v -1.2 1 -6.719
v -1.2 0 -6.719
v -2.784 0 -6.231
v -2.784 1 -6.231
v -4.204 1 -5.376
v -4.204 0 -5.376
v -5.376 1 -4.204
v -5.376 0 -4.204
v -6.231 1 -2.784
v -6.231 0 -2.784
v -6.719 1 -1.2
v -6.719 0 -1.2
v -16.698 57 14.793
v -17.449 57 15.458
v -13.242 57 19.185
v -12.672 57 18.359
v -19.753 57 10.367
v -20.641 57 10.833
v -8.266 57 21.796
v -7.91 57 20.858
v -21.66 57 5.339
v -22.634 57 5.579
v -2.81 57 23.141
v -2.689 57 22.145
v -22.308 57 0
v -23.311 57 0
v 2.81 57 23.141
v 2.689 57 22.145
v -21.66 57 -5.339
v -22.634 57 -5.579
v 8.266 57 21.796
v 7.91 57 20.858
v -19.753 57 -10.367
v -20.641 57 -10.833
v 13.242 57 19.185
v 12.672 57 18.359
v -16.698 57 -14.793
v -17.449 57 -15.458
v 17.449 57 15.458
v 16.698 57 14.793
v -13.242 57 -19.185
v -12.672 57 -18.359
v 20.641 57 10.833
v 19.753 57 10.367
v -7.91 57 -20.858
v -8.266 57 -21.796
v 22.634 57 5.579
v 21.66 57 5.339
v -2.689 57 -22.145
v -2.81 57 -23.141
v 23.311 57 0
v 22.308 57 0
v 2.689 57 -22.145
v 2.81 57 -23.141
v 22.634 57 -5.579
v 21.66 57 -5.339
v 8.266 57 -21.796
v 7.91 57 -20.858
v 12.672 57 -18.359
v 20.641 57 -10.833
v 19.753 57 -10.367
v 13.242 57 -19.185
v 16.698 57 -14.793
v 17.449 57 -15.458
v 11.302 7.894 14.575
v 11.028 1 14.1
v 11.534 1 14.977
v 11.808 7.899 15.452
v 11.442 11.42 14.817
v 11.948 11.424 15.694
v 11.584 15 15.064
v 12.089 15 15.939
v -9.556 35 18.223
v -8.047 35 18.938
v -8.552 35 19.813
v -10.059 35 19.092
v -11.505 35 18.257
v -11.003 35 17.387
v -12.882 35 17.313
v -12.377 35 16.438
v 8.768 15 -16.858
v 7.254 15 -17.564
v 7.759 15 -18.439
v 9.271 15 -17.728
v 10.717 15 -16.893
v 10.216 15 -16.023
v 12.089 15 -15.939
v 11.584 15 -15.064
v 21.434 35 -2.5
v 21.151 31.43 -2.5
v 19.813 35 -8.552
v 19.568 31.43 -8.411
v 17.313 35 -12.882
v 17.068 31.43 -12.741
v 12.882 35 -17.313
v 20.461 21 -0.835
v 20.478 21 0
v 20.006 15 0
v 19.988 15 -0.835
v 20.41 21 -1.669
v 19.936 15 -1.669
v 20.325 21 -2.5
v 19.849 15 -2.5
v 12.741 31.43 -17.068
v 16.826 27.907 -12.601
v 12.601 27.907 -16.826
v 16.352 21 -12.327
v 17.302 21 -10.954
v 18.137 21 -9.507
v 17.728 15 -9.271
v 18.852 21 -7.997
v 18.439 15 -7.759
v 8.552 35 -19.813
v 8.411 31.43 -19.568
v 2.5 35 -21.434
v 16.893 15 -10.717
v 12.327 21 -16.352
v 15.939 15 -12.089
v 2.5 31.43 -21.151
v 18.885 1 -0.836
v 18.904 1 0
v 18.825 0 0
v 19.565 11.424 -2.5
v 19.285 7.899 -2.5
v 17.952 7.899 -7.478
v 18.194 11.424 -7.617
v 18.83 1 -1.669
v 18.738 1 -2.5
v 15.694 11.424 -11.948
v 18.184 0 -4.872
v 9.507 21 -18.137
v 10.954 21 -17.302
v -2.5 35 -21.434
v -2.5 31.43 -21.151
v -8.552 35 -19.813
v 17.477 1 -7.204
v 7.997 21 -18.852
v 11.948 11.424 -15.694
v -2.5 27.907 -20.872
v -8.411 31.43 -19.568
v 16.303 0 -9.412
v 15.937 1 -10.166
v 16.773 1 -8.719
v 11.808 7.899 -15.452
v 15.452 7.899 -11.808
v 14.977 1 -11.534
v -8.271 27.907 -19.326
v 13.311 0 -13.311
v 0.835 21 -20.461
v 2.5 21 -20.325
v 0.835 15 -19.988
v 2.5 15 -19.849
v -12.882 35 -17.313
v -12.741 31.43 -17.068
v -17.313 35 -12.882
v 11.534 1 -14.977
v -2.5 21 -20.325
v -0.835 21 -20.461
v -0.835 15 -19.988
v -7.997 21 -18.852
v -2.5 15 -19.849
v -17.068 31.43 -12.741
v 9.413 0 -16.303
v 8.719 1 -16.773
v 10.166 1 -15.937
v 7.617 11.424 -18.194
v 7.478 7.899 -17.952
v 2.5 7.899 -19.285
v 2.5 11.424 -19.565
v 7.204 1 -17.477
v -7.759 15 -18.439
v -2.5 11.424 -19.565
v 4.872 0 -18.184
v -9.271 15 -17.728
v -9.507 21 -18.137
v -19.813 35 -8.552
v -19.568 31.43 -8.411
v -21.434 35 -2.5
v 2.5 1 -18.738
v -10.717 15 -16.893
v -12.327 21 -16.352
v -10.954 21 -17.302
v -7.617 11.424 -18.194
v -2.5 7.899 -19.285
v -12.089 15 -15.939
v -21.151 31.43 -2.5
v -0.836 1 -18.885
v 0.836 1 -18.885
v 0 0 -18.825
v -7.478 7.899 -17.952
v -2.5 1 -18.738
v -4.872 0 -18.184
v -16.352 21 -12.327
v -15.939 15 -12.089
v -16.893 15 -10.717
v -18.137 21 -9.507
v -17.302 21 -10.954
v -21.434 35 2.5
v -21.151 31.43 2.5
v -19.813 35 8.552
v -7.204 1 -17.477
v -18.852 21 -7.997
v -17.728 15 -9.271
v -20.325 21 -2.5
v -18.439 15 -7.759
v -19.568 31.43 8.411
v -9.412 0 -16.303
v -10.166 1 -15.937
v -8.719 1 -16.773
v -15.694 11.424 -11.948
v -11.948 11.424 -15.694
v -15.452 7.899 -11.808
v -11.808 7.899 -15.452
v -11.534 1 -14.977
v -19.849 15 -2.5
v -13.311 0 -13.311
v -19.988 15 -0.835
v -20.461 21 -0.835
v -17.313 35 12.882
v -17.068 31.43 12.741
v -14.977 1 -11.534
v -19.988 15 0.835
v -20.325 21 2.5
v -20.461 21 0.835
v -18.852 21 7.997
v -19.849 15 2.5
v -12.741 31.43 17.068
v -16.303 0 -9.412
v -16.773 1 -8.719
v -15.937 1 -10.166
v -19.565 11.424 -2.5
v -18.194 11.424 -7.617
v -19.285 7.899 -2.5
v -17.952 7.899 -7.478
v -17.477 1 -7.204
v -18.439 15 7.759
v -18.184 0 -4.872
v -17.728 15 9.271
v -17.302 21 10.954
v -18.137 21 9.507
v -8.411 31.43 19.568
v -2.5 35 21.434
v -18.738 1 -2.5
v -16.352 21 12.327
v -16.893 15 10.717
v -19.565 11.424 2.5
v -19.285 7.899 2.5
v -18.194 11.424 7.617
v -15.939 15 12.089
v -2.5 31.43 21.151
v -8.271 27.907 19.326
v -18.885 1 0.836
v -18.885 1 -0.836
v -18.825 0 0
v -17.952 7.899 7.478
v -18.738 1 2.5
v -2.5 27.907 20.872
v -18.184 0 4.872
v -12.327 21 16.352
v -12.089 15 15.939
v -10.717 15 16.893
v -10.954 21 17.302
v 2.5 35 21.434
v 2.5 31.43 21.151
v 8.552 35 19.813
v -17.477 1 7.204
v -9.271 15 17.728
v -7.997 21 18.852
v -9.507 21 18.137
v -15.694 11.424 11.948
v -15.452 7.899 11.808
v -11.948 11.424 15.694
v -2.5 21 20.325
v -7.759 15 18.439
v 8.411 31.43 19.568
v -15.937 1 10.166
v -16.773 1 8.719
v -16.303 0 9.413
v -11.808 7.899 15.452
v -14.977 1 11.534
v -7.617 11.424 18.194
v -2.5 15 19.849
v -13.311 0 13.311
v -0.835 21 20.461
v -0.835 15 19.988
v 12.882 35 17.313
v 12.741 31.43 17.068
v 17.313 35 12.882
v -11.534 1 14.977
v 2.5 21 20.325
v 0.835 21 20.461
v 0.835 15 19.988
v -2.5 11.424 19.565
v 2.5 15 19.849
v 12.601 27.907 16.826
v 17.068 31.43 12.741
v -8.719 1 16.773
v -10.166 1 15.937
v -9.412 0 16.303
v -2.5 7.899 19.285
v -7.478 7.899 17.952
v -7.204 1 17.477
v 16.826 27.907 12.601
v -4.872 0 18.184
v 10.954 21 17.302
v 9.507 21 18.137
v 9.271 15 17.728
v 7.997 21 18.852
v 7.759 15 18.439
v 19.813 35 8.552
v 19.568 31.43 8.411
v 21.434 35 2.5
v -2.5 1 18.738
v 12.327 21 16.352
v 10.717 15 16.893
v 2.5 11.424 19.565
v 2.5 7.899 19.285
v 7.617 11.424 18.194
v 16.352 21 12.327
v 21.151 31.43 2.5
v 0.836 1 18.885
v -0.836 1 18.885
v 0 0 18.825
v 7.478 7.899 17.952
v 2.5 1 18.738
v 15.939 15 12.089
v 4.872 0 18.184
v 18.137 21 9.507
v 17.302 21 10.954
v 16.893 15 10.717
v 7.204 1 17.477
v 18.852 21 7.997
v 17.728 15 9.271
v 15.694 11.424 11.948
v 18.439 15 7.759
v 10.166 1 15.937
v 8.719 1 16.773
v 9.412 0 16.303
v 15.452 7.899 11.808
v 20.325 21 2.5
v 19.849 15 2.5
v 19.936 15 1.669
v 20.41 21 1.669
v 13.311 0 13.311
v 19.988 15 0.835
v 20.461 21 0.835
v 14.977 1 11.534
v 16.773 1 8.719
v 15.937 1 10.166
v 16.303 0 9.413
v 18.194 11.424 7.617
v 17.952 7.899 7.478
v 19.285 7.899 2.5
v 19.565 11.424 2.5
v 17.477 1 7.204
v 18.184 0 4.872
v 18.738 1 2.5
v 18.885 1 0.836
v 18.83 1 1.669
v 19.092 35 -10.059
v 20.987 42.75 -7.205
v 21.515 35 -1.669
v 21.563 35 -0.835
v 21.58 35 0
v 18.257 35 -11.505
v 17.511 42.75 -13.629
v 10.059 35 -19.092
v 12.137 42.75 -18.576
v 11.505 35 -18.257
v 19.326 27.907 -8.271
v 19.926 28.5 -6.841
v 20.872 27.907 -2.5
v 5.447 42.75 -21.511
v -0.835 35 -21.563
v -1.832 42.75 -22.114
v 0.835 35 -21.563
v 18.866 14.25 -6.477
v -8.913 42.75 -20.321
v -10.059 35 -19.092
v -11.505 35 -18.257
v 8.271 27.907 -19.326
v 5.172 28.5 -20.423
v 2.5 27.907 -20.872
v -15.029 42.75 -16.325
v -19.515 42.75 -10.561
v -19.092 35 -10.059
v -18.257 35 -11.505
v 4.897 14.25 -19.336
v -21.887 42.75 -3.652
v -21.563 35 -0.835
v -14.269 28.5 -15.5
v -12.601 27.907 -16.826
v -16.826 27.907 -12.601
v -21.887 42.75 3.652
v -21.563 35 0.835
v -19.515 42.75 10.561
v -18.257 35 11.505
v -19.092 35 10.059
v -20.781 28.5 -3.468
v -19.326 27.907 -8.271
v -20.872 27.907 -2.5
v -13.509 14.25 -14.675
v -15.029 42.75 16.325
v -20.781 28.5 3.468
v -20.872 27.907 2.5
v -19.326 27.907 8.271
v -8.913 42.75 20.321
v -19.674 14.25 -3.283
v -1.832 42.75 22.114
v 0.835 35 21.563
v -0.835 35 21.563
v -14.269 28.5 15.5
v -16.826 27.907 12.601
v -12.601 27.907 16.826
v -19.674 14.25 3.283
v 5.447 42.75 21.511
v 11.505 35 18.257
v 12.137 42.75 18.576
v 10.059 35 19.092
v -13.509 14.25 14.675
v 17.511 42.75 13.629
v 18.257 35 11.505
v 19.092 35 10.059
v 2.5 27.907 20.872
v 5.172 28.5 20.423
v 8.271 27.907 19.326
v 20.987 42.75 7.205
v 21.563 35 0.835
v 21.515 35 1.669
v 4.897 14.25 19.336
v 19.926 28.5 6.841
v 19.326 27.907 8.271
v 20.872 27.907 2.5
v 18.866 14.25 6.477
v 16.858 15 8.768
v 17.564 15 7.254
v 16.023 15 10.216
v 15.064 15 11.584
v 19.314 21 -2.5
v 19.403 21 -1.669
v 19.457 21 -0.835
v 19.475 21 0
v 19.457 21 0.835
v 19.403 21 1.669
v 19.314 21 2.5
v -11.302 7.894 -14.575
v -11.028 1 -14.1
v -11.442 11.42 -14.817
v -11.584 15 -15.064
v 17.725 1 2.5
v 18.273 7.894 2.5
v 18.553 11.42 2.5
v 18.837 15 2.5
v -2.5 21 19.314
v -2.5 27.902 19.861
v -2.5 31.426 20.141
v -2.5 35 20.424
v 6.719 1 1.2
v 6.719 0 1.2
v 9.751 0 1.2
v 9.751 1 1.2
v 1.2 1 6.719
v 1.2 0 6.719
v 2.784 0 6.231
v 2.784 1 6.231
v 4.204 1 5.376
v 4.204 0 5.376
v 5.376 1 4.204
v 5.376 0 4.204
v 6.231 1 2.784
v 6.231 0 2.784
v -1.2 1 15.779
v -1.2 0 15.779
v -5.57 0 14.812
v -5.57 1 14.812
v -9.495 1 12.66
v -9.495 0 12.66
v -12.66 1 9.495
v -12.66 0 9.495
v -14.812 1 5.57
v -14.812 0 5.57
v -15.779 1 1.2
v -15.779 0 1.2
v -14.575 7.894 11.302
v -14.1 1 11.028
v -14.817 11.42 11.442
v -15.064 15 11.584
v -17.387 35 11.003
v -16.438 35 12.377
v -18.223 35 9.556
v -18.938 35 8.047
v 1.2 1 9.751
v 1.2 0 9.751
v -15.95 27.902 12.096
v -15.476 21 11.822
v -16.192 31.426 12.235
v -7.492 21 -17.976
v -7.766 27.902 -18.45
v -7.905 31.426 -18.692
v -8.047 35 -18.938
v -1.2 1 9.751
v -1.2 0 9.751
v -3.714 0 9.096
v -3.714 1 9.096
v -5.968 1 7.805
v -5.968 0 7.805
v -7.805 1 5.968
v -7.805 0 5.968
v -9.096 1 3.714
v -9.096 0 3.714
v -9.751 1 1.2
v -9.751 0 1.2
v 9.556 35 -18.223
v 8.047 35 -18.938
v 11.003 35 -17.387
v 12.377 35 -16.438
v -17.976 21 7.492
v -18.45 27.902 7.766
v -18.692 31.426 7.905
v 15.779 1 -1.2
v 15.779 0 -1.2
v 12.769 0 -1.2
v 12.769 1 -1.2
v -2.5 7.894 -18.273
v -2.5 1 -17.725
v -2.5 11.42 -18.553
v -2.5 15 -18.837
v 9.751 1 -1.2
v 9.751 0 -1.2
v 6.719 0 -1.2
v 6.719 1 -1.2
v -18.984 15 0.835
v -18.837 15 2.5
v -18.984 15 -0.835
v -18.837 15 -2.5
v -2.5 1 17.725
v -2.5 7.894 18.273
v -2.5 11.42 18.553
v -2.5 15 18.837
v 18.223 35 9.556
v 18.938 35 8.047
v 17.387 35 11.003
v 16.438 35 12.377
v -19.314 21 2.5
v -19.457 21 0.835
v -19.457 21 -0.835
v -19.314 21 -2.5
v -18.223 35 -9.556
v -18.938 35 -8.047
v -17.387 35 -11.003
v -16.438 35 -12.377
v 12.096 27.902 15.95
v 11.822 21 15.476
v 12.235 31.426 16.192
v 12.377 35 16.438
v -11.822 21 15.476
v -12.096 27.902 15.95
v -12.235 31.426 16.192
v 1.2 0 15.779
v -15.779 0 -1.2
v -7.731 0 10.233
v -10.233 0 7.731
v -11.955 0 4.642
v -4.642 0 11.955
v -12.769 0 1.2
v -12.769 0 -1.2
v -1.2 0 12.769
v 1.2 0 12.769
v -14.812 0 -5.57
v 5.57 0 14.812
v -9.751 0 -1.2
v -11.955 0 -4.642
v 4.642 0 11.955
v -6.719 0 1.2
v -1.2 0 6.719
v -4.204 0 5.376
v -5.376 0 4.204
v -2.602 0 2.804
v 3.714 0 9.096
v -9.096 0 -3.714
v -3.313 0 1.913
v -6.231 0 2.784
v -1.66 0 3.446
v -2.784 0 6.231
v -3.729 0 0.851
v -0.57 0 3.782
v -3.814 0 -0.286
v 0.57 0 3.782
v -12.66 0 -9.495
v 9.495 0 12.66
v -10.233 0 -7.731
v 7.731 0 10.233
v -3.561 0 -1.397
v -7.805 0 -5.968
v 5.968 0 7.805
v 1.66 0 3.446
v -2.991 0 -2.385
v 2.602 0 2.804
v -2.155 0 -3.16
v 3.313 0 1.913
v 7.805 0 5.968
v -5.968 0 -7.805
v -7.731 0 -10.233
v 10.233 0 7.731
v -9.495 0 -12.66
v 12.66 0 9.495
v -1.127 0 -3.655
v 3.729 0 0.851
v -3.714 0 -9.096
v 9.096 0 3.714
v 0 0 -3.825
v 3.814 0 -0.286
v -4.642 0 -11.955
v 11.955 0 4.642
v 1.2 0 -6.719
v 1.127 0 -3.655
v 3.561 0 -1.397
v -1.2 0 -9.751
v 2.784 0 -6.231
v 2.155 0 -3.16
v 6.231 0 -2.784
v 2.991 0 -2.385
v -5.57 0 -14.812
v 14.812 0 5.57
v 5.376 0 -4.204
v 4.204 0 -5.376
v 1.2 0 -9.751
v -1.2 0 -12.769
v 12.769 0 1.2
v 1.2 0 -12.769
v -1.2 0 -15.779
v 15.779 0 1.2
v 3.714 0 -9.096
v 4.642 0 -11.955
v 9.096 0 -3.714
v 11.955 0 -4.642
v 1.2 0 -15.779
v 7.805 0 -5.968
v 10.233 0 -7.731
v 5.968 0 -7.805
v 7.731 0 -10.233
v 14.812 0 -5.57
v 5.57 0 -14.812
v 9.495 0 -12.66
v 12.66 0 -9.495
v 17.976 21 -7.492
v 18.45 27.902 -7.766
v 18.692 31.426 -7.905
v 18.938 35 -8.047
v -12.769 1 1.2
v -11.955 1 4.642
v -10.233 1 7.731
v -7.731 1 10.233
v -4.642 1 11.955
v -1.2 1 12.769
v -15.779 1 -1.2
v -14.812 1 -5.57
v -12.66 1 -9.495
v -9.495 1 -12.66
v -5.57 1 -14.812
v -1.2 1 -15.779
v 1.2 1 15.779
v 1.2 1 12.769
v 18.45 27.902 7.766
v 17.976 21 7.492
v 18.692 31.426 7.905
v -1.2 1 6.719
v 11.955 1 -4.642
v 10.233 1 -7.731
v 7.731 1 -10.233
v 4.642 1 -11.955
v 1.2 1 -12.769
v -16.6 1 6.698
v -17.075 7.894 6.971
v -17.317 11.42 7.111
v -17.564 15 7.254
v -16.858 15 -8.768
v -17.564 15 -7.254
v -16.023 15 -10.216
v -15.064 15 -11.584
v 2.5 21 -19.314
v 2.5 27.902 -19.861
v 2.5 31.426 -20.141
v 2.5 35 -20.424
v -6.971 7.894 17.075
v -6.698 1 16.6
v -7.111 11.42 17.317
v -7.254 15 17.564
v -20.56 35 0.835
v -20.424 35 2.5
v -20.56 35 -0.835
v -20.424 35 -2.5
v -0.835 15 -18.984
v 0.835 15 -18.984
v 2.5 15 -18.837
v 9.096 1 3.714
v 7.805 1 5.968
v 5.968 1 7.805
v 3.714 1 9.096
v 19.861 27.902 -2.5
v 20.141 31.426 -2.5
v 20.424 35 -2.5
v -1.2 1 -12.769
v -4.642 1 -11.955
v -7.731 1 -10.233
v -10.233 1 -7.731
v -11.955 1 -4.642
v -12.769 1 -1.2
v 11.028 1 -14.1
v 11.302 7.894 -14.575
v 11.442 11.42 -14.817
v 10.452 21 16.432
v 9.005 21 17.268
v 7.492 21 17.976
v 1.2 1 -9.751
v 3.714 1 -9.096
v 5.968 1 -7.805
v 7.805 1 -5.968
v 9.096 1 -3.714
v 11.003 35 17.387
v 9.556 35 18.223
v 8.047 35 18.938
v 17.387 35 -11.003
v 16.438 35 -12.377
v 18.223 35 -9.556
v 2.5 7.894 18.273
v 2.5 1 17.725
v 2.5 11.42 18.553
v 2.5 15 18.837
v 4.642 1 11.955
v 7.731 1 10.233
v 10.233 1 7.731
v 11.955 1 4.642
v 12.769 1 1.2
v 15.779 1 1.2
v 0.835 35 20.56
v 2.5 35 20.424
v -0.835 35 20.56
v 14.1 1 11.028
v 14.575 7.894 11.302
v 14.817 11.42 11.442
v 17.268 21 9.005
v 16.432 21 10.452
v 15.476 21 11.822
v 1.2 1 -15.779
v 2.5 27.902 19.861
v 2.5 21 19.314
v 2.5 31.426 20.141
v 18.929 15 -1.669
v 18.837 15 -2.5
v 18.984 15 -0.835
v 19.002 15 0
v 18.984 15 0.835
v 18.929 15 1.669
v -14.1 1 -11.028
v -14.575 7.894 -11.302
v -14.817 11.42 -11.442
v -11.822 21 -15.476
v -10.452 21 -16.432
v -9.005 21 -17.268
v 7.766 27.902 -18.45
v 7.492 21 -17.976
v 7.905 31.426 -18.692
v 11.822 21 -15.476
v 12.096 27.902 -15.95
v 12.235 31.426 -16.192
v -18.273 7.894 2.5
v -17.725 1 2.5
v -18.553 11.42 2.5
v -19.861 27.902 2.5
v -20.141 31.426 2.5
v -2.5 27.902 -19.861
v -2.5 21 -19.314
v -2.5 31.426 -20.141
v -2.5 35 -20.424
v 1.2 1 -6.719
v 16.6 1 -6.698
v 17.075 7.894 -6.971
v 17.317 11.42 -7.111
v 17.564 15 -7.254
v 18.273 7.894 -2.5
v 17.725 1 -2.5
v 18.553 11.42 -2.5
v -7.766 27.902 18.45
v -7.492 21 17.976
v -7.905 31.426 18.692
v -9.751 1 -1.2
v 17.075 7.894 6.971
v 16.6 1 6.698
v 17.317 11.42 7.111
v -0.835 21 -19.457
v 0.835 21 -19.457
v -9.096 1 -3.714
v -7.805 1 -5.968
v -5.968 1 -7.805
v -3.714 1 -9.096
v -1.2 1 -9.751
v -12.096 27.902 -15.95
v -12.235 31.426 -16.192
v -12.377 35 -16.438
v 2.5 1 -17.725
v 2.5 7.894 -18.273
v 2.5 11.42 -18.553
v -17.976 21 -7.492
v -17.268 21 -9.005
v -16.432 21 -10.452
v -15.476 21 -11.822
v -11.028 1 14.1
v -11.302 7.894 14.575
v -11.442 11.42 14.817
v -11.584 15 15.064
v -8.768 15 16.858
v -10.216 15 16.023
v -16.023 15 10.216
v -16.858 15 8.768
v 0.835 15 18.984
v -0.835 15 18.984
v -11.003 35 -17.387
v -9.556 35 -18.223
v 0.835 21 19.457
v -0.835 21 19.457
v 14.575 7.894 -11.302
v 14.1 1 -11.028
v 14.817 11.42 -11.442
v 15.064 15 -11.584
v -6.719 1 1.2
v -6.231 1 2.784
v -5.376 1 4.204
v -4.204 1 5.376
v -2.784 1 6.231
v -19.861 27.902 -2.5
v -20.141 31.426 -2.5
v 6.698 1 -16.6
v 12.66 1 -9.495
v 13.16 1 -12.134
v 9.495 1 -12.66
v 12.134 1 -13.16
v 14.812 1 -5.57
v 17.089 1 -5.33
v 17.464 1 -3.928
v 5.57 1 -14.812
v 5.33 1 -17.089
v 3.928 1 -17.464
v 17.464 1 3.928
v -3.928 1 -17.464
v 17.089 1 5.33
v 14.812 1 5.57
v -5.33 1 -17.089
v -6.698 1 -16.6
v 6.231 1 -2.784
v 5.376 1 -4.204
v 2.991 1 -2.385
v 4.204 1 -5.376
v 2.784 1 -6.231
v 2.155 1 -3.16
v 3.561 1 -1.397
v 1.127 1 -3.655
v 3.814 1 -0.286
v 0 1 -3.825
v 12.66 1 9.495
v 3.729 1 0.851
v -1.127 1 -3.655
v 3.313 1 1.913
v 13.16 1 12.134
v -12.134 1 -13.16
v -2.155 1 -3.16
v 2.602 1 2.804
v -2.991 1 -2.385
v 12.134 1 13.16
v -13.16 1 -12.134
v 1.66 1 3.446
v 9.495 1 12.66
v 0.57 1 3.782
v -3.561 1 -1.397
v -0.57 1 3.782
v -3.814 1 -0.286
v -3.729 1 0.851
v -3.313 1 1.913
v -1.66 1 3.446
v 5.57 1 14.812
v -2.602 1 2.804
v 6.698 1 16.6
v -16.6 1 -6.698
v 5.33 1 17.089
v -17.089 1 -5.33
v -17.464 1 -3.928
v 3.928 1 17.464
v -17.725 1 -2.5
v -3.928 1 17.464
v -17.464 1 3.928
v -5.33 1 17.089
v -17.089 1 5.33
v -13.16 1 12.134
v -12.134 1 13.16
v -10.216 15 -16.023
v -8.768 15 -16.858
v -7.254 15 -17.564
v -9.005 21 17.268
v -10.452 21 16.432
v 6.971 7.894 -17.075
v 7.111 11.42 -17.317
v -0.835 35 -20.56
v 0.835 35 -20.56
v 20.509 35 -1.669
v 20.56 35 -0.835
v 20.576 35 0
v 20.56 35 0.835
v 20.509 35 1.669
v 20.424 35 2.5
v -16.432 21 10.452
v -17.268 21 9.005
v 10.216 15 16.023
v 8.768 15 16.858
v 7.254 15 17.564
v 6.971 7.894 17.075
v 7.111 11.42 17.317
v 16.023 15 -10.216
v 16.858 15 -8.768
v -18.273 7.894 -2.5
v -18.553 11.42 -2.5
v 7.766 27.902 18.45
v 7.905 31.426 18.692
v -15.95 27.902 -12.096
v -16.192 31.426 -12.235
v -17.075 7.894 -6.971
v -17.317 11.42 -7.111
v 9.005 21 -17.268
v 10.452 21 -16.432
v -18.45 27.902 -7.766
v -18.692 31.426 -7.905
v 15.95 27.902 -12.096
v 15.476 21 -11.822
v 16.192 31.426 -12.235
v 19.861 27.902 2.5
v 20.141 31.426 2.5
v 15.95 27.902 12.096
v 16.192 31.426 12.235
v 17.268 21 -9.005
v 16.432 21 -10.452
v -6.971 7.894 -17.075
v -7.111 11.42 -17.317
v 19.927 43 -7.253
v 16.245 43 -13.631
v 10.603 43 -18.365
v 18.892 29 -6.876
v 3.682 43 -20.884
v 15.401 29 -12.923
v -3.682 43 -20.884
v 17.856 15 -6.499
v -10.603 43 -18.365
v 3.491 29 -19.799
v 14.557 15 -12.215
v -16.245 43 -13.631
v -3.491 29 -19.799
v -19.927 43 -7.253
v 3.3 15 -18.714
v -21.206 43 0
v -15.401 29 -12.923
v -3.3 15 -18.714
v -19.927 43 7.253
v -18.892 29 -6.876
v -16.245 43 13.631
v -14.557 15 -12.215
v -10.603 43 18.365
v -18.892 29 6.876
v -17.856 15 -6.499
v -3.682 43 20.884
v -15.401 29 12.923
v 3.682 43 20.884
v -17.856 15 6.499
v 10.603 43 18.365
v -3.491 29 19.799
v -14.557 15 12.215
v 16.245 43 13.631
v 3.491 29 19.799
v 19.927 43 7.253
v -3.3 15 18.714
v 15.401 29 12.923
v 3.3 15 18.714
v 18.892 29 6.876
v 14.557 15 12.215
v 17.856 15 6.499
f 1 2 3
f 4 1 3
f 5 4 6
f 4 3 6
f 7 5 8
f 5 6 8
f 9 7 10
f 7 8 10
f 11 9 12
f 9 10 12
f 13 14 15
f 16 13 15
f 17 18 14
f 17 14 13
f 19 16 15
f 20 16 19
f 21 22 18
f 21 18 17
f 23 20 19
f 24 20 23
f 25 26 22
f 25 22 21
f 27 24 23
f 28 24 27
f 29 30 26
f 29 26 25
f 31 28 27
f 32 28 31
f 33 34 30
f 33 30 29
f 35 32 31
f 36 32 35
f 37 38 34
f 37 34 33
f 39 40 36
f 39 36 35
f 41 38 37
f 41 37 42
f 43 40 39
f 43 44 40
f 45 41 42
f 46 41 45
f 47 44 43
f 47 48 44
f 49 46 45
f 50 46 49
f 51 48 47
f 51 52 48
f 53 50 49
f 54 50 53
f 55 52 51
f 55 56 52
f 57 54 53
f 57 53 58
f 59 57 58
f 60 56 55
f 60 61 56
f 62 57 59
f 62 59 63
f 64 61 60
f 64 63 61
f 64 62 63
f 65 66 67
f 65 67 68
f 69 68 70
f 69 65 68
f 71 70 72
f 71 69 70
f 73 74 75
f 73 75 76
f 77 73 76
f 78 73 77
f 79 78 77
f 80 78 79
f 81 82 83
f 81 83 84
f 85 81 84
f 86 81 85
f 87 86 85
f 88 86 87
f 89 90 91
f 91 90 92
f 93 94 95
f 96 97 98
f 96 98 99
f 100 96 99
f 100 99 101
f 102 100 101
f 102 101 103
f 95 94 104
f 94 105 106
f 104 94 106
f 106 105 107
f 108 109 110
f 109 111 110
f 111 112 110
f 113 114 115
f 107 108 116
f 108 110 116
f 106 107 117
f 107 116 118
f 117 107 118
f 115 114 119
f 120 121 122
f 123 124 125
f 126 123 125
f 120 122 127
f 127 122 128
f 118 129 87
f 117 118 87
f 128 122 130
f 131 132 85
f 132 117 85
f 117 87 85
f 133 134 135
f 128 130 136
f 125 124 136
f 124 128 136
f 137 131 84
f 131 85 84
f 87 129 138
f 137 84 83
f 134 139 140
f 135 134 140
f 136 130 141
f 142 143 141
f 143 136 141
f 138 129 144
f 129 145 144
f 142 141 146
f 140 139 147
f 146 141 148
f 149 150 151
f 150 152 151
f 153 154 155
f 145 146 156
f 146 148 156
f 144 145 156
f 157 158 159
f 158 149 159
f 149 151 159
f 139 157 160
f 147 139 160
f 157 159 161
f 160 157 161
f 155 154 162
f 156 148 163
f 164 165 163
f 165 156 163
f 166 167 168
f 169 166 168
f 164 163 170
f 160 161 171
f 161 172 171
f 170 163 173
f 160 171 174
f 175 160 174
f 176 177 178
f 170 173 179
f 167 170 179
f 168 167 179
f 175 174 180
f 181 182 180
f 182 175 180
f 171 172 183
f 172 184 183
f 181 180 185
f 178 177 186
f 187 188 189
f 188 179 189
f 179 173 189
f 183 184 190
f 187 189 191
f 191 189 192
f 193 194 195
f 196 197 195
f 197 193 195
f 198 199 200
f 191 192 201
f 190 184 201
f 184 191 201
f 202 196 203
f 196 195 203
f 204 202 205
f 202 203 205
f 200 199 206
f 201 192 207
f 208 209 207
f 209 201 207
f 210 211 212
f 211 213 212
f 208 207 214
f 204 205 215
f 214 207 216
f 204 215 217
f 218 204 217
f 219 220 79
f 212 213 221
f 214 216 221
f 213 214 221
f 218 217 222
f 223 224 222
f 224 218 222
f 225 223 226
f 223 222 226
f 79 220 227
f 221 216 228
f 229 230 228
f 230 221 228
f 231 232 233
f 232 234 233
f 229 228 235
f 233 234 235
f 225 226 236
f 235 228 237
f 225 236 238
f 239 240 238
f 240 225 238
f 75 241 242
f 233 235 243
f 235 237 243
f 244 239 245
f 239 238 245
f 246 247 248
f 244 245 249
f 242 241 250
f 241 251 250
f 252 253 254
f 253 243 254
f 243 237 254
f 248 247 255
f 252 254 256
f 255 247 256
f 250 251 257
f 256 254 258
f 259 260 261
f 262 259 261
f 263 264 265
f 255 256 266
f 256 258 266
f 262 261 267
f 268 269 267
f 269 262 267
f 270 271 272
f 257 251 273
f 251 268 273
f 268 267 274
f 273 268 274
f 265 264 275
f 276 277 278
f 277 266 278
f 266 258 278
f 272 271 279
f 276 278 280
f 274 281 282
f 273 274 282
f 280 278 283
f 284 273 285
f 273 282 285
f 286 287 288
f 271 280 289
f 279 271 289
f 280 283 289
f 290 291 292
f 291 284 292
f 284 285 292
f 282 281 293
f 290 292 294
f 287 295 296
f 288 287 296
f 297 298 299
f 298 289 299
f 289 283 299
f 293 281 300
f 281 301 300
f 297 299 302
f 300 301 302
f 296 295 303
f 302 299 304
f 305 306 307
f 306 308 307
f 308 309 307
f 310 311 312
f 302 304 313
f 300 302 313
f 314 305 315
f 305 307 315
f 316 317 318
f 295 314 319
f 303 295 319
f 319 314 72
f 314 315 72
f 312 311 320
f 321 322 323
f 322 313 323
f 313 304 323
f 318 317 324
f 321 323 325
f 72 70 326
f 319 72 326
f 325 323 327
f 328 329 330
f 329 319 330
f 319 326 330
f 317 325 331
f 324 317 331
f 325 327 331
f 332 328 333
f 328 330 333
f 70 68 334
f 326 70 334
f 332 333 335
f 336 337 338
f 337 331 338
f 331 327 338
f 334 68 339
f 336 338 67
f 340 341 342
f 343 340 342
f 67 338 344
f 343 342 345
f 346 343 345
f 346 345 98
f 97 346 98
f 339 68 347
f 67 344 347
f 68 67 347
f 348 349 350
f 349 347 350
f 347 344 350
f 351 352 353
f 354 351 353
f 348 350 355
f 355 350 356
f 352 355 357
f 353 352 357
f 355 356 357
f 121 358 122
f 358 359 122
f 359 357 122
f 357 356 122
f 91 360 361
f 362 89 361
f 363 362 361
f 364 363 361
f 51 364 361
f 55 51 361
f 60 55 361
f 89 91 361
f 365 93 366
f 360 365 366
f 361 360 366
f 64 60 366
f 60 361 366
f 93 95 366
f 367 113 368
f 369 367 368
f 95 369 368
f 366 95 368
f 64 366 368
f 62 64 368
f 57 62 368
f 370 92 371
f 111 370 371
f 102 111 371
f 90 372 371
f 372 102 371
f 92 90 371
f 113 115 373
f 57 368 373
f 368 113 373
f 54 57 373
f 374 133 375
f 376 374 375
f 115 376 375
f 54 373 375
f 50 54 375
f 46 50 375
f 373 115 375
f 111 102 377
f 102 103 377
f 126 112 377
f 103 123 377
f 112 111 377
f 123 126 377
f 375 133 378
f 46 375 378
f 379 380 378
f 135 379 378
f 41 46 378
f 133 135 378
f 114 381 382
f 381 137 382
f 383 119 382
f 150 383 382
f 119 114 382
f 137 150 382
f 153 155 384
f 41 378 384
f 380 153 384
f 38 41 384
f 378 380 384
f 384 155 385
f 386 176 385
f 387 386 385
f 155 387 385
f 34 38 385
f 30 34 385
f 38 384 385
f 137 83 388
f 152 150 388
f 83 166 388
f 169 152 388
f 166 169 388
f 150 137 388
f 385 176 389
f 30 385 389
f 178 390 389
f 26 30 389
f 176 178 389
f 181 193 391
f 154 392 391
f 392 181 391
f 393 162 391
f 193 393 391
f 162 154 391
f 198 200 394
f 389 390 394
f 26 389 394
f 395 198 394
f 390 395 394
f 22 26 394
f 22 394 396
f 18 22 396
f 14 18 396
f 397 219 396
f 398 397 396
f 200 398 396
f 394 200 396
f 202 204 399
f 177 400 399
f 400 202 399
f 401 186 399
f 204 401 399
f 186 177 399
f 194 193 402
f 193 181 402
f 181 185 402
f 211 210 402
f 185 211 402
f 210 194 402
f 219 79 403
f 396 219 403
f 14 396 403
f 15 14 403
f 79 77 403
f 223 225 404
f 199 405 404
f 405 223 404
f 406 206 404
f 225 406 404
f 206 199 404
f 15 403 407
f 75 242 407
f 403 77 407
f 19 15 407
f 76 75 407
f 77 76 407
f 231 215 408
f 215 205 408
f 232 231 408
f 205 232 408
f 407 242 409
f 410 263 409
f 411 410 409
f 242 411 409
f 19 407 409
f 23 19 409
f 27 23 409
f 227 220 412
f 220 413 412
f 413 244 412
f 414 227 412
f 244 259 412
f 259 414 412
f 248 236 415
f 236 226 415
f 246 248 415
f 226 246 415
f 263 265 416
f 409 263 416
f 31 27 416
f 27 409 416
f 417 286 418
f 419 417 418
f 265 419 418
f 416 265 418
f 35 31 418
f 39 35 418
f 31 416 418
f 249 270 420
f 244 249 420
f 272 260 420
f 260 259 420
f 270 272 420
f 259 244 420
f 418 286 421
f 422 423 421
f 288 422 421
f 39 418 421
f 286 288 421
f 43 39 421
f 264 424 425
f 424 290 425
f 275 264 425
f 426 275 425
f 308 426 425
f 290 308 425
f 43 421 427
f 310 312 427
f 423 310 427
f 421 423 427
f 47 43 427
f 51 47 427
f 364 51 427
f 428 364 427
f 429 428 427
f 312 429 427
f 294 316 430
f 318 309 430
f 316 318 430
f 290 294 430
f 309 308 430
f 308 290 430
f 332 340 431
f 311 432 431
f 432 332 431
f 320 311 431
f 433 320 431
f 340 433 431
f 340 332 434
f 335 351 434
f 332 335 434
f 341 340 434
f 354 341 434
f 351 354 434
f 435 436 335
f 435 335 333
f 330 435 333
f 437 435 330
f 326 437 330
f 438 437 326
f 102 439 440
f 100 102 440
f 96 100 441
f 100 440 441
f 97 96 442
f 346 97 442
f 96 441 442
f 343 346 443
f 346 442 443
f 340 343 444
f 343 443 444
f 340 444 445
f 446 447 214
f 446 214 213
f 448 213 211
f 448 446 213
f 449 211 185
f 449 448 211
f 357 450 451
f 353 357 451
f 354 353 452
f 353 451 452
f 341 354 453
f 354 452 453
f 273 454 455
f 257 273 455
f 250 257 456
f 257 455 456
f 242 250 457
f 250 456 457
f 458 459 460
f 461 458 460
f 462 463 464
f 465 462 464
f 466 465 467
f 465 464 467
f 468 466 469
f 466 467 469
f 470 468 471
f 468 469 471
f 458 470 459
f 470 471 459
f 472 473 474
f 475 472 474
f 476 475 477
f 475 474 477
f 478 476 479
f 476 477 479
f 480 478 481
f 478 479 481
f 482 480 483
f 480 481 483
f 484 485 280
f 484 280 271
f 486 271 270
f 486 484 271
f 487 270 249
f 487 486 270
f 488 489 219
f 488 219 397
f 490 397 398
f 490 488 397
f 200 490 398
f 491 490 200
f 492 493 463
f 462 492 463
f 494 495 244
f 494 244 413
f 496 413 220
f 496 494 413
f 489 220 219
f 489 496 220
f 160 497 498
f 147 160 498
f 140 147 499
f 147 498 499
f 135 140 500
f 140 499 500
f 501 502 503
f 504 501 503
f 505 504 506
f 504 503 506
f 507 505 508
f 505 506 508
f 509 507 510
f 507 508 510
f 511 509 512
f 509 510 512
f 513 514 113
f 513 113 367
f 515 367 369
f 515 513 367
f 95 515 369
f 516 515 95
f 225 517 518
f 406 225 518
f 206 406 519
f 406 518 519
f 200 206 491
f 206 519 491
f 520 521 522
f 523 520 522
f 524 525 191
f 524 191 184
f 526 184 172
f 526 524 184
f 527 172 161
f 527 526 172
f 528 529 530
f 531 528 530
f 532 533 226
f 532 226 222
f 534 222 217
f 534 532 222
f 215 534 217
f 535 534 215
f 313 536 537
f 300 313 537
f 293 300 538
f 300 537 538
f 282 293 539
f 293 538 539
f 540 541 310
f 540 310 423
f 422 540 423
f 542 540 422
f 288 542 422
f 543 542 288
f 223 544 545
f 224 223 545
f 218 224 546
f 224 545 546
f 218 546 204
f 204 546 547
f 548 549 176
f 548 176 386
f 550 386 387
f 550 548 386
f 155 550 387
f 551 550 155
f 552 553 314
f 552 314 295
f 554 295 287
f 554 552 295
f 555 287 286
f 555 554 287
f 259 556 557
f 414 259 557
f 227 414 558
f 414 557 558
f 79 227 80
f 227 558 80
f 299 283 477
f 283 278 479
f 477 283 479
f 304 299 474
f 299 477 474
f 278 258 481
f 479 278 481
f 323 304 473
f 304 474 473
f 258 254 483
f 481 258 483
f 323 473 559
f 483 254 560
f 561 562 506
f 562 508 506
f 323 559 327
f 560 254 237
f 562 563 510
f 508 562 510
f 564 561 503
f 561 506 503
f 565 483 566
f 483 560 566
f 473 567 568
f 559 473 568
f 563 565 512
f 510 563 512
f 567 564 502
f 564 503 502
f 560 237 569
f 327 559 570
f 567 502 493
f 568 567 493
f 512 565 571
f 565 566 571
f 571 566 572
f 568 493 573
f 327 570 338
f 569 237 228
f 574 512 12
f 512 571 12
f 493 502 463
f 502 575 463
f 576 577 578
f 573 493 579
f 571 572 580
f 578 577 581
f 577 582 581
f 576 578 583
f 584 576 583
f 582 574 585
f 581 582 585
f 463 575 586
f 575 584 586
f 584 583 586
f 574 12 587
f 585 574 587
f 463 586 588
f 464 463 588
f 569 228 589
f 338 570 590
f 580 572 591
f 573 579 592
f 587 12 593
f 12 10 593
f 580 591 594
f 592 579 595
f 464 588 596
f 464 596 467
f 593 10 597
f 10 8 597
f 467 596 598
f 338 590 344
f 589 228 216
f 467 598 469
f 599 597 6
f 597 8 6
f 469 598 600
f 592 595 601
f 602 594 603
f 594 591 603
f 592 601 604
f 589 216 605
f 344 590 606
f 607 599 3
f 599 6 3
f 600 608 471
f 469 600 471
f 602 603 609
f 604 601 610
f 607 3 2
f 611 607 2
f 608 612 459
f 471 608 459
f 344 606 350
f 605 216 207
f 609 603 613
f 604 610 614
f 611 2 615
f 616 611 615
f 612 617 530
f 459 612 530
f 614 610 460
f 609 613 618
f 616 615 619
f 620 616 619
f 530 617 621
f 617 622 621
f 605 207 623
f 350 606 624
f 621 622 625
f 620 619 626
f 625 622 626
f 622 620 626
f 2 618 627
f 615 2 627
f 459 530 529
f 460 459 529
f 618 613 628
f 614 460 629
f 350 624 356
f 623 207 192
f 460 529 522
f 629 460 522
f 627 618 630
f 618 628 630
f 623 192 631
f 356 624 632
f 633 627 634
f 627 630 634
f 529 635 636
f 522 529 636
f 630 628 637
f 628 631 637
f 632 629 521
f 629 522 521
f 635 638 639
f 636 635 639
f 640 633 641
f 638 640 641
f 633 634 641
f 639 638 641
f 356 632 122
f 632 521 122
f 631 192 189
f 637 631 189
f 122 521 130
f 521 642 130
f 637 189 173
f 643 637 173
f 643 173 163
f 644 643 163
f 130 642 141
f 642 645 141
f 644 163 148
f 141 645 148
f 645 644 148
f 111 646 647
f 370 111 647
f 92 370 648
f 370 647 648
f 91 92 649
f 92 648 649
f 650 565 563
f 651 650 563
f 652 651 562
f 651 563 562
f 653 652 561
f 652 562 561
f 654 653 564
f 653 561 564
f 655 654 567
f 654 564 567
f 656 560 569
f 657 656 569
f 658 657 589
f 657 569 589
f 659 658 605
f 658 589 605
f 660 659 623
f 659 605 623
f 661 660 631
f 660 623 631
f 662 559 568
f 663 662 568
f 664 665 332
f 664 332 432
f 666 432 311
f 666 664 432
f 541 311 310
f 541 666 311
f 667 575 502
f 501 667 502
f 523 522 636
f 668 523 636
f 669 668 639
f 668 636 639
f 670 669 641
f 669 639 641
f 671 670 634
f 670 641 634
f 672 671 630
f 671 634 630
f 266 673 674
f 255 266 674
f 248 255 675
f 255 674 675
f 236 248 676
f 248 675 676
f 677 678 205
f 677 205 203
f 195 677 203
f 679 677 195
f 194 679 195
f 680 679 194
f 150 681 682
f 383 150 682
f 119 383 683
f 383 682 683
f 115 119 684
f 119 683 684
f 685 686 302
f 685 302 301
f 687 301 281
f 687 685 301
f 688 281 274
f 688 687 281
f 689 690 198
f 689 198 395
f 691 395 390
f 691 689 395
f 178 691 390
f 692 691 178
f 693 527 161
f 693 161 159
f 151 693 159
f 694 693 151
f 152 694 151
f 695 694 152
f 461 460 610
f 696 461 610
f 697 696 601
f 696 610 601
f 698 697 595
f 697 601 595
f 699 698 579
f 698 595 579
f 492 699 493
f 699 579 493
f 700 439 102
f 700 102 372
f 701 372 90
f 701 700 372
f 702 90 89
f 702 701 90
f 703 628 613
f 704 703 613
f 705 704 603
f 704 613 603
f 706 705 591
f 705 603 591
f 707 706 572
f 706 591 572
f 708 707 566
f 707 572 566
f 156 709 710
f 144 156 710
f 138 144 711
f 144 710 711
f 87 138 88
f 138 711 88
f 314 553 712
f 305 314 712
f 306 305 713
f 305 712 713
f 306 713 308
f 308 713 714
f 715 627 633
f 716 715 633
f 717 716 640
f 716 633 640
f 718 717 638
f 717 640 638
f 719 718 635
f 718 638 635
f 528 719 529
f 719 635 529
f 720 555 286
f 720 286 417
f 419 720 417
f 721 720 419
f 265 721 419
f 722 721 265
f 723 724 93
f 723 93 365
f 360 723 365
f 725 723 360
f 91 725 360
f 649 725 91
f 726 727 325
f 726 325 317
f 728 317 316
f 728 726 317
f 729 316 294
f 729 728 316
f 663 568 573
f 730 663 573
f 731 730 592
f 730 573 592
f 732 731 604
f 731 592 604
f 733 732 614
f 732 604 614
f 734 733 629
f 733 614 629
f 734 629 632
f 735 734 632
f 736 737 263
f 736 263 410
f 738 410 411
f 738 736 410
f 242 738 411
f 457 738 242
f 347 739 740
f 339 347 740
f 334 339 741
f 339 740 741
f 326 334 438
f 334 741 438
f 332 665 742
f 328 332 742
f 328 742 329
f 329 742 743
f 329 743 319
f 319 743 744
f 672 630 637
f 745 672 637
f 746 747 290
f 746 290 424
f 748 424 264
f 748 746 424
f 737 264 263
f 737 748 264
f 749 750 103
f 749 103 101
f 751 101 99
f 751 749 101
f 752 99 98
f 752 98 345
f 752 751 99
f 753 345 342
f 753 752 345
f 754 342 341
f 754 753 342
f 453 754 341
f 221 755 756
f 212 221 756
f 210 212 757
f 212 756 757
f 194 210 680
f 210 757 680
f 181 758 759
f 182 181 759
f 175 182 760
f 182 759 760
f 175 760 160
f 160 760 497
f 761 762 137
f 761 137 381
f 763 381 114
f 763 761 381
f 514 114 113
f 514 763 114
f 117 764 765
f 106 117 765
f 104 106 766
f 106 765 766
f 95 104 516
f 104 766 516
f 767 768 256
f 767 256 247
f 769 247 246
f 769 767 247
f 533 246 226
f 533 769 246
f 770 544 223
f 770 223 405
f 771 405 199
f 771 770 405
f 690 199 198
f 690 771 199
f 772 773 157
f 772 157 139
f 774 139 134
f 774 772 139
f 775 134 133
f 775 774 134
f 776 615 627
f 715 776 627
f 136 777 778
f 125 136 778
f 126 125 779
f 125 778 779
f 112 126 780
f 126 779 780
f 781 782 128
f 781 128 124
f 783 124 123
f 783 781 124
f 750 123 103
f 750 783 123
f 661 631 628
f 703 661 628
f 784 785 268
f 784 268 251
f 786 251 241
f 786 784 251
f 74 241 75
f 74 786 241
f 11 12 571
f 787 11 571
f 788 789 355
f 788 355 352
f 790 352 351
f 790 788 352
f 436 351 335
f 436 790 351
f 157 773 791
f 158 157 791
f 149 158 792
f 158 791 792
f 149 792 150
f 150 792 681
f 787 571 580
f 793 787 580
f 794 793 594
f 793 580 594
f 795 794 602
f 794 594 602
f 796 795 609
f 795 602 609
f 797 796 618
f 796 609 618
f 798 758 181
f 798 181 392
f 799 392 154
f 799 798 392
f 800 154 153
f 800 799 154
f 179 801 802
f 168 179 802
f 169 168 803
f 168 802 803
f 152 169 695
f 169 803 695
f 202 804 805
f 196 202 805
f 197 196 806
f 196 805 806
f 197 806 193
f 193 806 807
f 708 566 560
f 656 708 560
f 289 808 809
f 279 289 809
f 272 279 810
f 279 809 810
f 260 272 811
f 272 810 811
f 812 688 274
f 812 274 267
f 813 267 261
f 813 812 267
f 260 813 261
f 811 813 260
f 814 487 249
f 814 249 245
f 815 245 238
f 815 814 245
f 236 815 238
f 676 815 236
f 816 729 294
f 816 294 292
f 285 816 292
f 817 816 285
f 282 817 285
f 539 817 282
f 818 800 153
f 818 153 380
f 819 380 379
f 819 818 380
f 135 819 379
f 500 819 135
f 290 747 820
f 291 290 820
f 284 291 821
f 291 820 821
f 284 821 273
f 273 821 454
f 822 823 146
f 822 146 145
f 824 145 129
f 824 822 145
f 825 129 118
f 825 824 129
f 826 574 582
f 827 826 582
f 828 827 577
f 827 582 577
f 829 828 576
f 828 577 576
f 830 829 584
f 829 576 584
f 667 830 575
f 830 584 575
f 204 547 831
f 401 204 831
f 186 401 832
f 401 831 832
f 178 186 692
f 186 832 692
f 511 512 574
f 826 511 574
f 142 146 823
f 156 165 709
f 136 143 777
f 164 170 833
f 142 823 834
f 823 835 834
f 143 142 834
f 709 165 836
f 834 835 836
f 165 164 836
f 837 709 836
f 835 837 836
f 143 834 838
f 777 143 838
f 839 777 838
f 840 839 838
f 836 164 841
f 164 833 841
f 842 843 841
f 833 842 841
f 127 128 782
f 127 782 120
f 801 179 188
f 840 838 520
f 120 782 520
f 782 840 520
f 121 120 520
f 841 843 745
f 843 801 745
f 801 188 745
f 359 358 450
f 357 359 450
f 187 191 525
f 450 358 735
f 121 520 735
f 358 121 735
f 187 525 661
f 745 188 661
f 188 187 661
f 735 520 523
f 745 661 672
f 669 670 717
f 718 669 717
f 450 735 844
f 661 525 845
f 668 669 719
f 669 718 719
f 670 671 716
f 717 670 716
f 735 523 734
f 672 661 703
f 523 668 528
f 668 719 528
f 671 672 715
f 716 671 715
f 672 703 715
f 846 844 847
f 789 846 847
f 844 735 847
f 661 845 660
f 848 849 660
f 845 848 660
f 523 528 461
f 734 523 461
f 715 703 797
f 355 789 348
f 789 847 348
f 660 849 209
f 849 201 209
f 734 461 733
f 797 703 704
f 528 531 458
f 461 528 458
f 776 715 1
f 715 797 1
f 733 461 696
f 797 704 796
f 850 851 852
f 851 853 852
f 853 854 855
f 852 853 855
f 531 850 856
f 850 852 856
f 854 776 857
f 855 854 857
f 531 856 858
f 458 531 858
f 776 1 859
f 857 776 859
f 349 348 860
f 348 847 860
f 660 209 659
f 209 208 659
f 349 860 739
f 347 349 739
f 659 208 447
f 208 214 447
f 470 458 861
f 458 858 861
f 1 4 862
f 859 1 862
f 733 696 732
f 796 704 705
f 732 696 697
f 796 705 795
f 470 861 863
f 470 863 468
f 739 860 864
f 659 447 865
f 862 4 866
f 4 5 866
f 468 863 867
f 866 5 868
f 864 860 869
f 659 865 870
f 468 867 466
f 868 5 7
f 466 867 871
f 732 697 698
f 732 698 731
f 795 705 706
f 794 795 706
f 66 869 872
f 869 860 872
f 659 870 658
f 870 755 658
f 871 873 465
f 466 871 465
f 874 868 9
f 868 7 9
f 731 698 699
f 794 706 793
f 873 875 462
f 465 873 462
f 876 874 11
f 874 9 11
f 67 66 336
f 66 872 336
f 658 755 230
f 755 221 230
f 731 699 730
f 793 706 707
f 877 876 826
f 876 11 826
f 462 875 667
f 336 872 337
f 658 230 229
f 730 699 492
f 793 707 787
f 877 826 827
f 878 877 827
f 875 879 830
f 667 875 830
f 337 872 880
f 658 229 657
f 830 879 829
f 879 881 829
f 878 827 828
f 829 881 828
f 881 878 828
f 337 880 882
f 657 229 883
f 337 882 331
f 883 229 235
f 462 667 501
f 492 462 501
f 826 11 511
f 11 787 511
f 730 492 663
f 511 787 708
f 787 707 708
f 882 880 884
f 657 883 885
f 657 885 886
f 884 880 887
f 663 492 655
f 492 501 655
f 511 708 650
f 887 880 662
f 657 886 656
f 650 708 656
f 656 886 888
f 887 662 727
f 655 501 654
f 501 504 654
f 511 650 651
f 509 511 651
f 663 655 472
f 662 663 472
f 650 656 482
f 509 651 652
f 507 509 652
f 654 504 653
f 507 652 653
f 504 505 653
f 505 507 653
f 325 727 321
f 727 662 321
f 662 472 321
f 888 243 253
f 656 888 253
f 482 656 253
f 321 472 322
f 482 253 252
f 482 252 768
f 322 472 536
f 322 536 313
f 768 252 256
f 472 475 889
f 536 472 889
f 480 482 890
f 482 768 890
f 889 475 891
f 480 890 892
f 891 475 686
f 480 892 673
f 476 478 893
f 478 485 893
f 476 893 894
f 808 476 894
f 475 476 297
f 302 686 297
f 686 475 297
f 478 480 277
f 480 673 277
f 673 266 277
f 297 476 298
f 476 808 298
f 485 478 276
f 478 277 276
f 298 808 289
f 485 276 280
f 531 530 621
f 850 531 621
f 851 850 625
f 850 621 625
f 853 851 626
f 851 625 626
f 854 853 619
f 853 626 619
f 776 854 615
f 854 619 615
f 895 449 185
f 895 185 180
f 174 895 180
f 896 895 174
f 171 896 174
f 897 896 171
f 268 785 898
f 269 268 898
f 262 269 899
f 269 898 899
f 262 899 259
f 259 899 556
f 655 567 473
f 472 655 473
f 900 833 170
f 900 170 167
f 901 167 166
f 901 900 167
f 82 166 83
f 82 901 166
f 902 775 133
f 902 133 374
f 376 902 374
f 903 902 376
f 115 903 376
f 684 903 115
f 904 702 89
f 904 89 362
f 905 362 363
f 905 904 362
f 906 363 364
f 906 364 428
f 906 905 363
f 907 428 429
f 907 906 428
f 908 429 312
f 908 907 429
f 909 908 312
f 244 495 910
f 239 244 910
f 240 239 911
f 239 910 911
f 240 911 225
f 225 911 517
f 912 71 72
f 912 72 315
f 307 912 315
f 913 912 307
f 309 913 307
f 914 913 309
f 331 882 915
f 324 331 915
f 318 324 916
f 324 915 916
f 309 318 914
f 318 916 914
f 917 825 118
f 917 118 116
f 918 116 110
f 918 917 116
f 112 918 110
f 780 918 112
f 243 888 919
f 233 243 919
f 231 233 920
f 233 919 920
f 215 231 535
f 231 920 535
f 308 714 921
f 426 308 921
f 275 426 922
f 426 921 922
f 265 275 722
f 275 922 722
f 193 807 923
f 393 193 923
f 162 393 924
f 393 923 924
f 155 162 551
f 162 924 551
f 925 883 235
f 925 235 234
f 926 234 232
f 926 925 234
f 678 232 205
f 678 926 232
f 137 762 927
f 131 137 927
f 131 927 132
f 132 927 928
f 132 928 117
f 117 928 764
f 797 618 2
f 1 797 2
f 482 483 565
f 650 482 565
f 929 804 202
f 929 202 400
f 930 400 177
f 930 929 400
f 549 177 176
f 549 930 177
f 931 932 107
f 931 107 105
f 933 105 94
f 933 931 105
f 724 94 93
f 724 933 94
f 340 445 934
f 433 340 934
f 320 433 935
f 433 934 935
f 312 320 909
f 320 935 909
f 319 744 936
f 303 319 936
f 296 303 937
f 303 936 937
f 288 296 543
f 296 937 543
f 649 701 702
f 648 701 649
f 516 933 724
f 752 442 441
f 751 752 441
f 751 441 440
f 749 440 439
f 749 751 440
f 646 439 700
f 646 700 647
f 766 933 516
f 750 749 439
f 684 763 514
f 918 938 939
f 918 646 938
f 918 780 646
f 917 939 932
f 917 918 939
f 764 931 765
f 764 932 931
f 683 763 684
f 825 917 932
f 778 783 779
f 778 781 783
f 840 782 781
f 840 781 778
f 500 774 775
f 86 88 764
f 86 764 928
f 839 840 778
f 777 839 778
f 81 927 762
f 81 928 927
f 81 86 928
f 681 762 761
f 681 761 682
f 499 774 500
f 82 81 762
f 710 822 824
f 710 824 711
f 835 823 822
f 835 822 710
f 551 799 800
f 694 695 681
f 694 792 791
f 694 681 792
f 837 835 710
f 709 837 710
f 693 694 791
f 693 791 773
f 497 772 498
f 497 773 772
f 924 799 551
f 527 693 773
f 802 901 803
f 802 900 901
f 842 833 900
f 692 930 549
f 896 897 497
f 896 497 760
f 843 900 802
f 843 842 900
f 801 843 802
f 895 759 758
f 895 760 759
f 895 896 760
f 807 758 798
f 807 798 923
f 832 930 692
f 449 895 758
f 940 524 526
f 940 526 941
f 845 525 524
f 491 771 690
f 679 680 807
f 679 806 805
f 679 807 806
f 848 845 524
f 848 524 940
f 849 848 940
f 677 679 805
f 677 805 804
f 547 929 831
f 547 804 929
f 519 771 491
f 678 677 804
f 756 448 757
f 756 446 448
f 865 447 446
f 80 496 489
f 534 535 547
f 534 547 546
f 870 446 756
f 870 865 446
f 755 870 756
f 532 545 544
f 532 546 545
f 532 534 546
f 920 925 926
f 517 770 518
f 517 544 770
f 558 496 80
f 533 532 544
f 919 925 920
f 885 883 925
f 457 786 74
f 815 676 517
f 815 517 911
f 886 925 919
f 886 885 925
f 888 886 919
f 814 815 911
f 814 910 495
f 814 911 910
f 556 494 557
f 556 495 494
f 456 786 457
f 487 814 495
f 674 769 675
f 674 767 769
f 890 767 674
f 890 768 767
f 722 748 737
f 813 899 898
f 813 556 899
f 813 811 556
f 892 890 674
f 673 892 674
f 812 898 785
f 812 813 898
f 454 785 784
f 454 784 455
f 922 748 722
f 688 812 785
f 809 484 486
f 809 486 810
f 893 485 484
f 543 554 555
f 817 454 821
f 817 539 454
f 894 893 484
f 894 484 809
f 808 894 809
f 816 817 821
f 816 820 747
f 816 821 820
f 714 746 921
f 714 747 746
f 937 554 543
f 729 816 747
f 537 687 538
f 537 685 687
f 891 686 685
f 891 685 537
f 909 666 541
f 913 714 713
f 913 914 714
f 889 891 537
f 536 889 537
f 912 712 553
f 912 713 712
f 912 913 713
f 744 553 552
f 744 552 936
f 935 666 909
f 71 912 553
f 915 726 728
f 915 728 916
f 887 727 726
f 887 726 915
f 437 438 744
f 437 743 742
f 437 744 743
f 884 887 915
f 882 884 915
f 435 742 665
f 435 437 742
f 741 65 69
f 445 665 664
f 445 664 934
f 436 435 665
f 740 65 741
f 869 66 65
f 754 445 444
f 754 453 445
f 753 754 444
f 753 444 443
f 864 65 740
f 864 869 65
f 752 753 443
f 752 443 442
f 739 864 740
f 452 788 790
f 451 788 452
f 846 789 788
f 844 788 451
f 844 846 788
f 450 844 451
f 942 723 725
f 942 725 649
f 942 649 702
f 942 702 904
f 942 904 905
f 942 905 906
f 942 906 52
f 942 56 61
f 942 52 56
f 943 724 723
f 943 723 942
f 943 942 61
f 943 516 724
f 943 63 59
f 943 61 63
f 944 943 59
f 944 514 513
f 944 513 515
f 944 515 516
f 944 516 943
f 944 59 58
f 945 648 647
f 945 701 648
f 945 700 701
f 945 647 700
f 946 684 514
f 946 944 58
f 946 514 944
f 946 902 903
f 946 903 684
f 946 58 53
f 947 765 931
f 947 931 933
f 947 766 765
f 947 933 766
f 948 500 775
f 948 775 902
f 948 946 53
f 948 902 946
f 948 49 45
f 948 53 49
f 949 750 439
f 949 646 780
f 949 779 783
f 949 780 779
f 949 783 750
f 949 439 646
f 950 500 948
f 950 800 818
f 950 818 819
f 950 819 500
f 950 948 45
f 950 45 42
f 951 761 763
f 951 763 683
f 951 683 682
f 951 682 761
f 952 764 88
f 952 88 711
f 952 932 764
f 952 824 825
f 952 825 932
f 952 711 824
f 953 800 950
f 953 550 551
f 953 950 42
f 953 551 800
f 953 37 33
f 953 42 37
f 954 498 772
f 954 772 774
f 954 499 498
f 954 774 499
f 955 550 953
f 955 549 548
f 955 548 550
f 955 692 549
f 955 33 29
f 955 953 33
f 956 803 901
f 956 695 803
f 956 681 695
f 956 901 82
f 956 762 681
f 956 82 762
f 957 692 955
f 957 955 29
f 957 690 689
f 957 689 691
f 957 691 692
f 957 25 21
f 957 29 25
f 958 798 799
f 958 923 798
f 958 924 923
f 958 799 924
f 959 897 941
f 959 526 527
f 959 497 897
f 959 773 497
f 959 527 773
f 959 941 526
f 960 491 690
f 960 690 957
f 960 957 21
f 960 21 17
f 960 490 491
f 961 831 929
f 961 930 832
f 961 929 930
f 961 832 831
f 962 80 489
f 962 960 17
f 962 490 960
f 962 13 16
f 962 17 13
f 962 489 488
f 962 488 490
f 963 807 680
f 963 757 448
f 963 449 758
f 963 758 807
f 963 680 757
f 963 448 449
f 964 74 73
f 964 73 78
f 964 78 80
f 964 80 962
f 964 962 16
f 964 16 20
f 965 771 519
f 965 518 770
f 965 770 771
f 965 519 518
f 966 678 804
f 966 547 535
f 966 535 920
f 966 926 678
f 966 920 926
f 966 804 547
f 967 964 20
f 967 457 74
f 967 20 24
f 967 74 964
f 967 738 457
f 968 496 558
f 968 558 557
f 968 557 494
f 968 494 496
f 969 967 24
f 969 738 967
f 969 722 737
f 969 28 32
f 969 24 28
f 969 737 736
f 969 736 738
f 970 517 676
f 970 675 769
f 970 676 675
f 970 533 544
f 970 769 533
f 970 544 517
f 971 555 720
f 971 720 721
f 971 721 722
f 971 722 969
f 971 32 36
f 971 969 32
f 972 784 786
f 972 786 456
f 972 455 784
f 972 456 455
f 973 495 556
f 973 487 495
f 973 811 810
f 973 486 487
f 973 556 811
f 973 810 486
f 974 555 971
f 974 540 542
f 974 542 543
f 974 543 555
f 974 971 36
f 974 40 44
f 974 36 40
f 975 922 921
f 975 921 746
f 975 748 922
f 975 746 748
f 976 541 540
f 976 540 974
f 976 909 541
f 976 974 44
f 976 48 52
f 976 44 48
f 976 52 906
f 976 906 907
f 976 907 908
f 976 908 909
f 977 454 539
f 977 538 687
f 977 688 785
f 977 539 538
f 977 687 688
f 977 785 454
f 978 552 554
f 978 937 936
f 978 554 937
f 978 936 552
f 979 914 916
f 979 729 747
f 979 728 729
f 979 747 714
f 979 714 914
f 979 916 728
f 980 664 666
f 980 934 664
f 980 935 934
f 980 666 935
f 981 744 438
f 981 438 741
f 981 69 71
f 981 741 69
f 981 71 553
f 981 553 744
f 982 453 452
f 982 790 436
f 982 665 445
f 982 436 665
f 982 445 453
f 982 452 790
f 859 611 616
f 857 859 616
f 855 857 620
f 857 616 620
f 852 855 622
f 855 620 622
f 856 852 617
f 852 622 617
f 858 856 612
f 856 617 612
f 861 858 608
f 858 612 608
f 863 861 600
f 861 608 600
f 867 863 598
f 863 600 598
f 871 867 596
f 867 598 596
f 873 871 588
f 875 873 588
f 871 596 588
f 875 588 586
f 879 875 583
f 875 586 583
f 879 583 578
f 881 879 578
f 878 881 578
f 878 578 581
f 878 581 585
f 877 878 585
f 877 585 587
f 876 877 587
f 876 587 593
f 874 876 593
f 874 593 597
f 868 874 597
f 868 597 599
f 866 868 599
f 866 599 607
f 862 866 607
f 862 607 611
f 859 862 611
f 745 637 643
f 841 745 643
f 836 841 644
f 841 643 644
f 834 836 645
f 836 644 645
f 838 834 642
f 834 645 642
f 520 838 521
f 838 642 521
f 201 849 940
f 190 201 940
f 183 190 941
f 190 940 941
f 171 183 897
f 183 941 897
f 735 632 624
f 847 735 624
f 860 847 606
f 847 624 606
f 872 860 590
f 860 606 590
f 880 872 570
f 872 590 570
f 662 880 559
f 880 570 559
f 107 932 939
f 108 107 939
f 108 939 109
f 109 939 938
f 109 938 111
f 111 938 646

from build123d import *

# Parameters (mm, degrees)
SKETCH1_R           = 18.825
BOSS_EXTRUDE1_DEPTH = 57
BOSS_EXTRUDE1_DRAFT = -4.5
SHELL1_T            = -1
SKETCH4_R           = 3.825
CUT_EXTRUDE1_DEPTH  = 57
SKETCH5_W           = 5
SKETCH5_H           = 14
CUT_EXTRUDE2_DEPTH  = 66.846831277
CIRPATTERN1_COUNT   = 12


with BuildPart() as part:
    # Sketch1 → Boss-Extrude1 (with draft: the straight prism first)
    with BuildSketch(Plane(origin=(0, 0, 0), x_dir=(1, 0, 0), z_dir=(0, 1, 0))):
        Circle(SKETCH1_R)
    extrude(amount=BOSS_EXTRUDE1_DEPTH)
    # Boss-Extrude1: the draft: its side faces are tilted about the plane it starts from
    boss_extrude1_sides = [part.faces().sort_by_distance(p)[0] for p in [
        (-18.825, 28.5, 0),
    ]]
    draft(boss_extrude1_sides, Plane(origin=(0, 0, 0), x_dir=(1, 0, 0), z_dir=(0, 1, 0)), BOSS_EXTRUDE1_DRAFT)

    # Shell1
    shell1_openings = [part.faces().sort_by_distance(p)[0] for p in [
        (0, 57, 0),
    ]]
    offset(amount=SHELL1_T, openings=shell1_openings, kind=Kind.INTERSECTION)

    # Sketch4 → Cut-Extrude1 (cut)
    with BuildSketch(Plane.XZ):
        Circle(SKETCH4_R)
        with BuildLine():
            Line((9.751442201, -1.2), (6.718677325, -1.2))
            ThreePointArc((6.718677325, -1.2), (4.826003782, -4.826003782), (1.2, -6.718677325))
            Line((1.2, -6.718677325), (1.2, -9.751442201))
            ThreePointArc((1.2, -9.751442201), (6.947324125, -6.947324125), (9.751442201, -1.2))
        make_face()
        with BuildLine():
            Line((15.779436777, -1.2), (12.768736233, -1.2))
            ThreePointArc((12.768736233, -1.2), (9.068644469, -9.068644469), (1.2, -12.768736233))
            Line((1.2, -12.768736233), (1.2, -15.779436777))
            ThreePointArc((1.2, -15.779436777), (11.189964812, -11.189964812), (15.779436777, -1.2))
        make_face()
        with BuildLine():
            Line((-1.2, -9.751442201), (-1.2, -6.718677325))
            ThreePointArc((-1.2, -6.718677325), (-4.826003782, -4.826003782), (-6.718677325, -1.2))
            Line((-6.718677325, -1.2), (-9.751442201, -1.2))
            ThreePointArc((-9.751442201, -1.2), (-6.947324125, -6.947324125), (-1.2, -9.751442201))
        make_face()
        with BuildLine():
            ThreePointArc((1.2, 6.718677325), (4.826003782, 4.826003782), (6.718677325, 1.2))
            Line((6.718677325, 1.2), (9.751442201, 1.2))
            ThreePointArc((9.751442201, 1.2), (6.947324125, 6.947324125), (1.2, 9.751442201))
            Line((1.2, 9.751442201), (1.2, 6.718677325))
        make_face()
        with BuildLine():
            Line((-1.2, -15.779436777), (-1.2, -12.768736233))
            ThreePointArc((-1.2, -12.768736233), (-9.068644469, -9.068644469), (-12.768736233, -1.2))
            Line((-12.768736233, -1.2), (-15.779436777, -1.2))
            ThreePointArc((-15.779436777, -1.2), (-11.189964812, -11.189964812), (-1.2, -15.779436777))
        make_face()
        with BuildLine():
            ThreePointArc((1.2, 12.768736233), (9.068644469, 9.068644469), (12.768736233, 1.2))
            Line((12.768736233, 1.2), (15.779436777, 1.2))
            ThreePointArc((15.779436777, 1.2), (11.189964812, 11.189964812), (1.2, 15.779436777))
            Line((1.2, 15.779436777), (1.2, 12.768736233))
        make_face()
        with BuildLine():
            Line((-9.751442201, 1.2), (-6.718677325, 1.2))
            ThreePointArc((-6.718677325, 1.2), (-4.826003782, 4.826003782), (-1.2, 6.718677325))
            Line((-1.2, 6.718677325), (-1.2, 9.751442201))
            ThreePointArc((-1.2, 9.751442201), (-6.947324125, 6.947324125), (-9.751442201, 1.2))
        make_face()
        with BuildLine():
            Line((-15.779436777, 1.2), (-12.768736233, 1.2))
            ThreePointArc((-12.768736233, 1.2), (-9.068644469, 9.068644469), (-1.2, 12.768736233))
            Line((-1.2, 12.768736233), (-1.2, 15.779436777))
            ThreePointArc((-1.2, 15.779436777), (-11.189964812, 11.189964812), (-15.779436777, 1.2))
        make_face()
    extrude(amount=-CUT_EXTRUDE1_DEPTH, mode=Mode.SUBTRACT)

    # Sketch5 → Cut-Extrude2 (cut, through all)
    with BuildSketch(Plane.XY):
        with Locations((0, 8)):
            Rectangle(SKETCH5_W, SKETCH5_H)
        with Locations((0, 28)):
            Rectangle(SKETCH5_W, SKETCH5_H)
    cut_extrude2 = extrude(amount=-CUT_EXTRUDE2_DEPTH, mode=Mode.SUBTRACT)

    # CirPattern1: Cut-Extrude2 ×12 about axis
    cirpattern1_axis = Axis((0, 0, 0), (0, -1, 0))
    for i in range(1, CIRPATTERN1_COUNT):
        add(cut_extrude2.rotate(cirpattern1_axis, i * 360 / CIRPATTERN1_COUNT), mode=Mode.SUBTRACT)


solid = part.part
